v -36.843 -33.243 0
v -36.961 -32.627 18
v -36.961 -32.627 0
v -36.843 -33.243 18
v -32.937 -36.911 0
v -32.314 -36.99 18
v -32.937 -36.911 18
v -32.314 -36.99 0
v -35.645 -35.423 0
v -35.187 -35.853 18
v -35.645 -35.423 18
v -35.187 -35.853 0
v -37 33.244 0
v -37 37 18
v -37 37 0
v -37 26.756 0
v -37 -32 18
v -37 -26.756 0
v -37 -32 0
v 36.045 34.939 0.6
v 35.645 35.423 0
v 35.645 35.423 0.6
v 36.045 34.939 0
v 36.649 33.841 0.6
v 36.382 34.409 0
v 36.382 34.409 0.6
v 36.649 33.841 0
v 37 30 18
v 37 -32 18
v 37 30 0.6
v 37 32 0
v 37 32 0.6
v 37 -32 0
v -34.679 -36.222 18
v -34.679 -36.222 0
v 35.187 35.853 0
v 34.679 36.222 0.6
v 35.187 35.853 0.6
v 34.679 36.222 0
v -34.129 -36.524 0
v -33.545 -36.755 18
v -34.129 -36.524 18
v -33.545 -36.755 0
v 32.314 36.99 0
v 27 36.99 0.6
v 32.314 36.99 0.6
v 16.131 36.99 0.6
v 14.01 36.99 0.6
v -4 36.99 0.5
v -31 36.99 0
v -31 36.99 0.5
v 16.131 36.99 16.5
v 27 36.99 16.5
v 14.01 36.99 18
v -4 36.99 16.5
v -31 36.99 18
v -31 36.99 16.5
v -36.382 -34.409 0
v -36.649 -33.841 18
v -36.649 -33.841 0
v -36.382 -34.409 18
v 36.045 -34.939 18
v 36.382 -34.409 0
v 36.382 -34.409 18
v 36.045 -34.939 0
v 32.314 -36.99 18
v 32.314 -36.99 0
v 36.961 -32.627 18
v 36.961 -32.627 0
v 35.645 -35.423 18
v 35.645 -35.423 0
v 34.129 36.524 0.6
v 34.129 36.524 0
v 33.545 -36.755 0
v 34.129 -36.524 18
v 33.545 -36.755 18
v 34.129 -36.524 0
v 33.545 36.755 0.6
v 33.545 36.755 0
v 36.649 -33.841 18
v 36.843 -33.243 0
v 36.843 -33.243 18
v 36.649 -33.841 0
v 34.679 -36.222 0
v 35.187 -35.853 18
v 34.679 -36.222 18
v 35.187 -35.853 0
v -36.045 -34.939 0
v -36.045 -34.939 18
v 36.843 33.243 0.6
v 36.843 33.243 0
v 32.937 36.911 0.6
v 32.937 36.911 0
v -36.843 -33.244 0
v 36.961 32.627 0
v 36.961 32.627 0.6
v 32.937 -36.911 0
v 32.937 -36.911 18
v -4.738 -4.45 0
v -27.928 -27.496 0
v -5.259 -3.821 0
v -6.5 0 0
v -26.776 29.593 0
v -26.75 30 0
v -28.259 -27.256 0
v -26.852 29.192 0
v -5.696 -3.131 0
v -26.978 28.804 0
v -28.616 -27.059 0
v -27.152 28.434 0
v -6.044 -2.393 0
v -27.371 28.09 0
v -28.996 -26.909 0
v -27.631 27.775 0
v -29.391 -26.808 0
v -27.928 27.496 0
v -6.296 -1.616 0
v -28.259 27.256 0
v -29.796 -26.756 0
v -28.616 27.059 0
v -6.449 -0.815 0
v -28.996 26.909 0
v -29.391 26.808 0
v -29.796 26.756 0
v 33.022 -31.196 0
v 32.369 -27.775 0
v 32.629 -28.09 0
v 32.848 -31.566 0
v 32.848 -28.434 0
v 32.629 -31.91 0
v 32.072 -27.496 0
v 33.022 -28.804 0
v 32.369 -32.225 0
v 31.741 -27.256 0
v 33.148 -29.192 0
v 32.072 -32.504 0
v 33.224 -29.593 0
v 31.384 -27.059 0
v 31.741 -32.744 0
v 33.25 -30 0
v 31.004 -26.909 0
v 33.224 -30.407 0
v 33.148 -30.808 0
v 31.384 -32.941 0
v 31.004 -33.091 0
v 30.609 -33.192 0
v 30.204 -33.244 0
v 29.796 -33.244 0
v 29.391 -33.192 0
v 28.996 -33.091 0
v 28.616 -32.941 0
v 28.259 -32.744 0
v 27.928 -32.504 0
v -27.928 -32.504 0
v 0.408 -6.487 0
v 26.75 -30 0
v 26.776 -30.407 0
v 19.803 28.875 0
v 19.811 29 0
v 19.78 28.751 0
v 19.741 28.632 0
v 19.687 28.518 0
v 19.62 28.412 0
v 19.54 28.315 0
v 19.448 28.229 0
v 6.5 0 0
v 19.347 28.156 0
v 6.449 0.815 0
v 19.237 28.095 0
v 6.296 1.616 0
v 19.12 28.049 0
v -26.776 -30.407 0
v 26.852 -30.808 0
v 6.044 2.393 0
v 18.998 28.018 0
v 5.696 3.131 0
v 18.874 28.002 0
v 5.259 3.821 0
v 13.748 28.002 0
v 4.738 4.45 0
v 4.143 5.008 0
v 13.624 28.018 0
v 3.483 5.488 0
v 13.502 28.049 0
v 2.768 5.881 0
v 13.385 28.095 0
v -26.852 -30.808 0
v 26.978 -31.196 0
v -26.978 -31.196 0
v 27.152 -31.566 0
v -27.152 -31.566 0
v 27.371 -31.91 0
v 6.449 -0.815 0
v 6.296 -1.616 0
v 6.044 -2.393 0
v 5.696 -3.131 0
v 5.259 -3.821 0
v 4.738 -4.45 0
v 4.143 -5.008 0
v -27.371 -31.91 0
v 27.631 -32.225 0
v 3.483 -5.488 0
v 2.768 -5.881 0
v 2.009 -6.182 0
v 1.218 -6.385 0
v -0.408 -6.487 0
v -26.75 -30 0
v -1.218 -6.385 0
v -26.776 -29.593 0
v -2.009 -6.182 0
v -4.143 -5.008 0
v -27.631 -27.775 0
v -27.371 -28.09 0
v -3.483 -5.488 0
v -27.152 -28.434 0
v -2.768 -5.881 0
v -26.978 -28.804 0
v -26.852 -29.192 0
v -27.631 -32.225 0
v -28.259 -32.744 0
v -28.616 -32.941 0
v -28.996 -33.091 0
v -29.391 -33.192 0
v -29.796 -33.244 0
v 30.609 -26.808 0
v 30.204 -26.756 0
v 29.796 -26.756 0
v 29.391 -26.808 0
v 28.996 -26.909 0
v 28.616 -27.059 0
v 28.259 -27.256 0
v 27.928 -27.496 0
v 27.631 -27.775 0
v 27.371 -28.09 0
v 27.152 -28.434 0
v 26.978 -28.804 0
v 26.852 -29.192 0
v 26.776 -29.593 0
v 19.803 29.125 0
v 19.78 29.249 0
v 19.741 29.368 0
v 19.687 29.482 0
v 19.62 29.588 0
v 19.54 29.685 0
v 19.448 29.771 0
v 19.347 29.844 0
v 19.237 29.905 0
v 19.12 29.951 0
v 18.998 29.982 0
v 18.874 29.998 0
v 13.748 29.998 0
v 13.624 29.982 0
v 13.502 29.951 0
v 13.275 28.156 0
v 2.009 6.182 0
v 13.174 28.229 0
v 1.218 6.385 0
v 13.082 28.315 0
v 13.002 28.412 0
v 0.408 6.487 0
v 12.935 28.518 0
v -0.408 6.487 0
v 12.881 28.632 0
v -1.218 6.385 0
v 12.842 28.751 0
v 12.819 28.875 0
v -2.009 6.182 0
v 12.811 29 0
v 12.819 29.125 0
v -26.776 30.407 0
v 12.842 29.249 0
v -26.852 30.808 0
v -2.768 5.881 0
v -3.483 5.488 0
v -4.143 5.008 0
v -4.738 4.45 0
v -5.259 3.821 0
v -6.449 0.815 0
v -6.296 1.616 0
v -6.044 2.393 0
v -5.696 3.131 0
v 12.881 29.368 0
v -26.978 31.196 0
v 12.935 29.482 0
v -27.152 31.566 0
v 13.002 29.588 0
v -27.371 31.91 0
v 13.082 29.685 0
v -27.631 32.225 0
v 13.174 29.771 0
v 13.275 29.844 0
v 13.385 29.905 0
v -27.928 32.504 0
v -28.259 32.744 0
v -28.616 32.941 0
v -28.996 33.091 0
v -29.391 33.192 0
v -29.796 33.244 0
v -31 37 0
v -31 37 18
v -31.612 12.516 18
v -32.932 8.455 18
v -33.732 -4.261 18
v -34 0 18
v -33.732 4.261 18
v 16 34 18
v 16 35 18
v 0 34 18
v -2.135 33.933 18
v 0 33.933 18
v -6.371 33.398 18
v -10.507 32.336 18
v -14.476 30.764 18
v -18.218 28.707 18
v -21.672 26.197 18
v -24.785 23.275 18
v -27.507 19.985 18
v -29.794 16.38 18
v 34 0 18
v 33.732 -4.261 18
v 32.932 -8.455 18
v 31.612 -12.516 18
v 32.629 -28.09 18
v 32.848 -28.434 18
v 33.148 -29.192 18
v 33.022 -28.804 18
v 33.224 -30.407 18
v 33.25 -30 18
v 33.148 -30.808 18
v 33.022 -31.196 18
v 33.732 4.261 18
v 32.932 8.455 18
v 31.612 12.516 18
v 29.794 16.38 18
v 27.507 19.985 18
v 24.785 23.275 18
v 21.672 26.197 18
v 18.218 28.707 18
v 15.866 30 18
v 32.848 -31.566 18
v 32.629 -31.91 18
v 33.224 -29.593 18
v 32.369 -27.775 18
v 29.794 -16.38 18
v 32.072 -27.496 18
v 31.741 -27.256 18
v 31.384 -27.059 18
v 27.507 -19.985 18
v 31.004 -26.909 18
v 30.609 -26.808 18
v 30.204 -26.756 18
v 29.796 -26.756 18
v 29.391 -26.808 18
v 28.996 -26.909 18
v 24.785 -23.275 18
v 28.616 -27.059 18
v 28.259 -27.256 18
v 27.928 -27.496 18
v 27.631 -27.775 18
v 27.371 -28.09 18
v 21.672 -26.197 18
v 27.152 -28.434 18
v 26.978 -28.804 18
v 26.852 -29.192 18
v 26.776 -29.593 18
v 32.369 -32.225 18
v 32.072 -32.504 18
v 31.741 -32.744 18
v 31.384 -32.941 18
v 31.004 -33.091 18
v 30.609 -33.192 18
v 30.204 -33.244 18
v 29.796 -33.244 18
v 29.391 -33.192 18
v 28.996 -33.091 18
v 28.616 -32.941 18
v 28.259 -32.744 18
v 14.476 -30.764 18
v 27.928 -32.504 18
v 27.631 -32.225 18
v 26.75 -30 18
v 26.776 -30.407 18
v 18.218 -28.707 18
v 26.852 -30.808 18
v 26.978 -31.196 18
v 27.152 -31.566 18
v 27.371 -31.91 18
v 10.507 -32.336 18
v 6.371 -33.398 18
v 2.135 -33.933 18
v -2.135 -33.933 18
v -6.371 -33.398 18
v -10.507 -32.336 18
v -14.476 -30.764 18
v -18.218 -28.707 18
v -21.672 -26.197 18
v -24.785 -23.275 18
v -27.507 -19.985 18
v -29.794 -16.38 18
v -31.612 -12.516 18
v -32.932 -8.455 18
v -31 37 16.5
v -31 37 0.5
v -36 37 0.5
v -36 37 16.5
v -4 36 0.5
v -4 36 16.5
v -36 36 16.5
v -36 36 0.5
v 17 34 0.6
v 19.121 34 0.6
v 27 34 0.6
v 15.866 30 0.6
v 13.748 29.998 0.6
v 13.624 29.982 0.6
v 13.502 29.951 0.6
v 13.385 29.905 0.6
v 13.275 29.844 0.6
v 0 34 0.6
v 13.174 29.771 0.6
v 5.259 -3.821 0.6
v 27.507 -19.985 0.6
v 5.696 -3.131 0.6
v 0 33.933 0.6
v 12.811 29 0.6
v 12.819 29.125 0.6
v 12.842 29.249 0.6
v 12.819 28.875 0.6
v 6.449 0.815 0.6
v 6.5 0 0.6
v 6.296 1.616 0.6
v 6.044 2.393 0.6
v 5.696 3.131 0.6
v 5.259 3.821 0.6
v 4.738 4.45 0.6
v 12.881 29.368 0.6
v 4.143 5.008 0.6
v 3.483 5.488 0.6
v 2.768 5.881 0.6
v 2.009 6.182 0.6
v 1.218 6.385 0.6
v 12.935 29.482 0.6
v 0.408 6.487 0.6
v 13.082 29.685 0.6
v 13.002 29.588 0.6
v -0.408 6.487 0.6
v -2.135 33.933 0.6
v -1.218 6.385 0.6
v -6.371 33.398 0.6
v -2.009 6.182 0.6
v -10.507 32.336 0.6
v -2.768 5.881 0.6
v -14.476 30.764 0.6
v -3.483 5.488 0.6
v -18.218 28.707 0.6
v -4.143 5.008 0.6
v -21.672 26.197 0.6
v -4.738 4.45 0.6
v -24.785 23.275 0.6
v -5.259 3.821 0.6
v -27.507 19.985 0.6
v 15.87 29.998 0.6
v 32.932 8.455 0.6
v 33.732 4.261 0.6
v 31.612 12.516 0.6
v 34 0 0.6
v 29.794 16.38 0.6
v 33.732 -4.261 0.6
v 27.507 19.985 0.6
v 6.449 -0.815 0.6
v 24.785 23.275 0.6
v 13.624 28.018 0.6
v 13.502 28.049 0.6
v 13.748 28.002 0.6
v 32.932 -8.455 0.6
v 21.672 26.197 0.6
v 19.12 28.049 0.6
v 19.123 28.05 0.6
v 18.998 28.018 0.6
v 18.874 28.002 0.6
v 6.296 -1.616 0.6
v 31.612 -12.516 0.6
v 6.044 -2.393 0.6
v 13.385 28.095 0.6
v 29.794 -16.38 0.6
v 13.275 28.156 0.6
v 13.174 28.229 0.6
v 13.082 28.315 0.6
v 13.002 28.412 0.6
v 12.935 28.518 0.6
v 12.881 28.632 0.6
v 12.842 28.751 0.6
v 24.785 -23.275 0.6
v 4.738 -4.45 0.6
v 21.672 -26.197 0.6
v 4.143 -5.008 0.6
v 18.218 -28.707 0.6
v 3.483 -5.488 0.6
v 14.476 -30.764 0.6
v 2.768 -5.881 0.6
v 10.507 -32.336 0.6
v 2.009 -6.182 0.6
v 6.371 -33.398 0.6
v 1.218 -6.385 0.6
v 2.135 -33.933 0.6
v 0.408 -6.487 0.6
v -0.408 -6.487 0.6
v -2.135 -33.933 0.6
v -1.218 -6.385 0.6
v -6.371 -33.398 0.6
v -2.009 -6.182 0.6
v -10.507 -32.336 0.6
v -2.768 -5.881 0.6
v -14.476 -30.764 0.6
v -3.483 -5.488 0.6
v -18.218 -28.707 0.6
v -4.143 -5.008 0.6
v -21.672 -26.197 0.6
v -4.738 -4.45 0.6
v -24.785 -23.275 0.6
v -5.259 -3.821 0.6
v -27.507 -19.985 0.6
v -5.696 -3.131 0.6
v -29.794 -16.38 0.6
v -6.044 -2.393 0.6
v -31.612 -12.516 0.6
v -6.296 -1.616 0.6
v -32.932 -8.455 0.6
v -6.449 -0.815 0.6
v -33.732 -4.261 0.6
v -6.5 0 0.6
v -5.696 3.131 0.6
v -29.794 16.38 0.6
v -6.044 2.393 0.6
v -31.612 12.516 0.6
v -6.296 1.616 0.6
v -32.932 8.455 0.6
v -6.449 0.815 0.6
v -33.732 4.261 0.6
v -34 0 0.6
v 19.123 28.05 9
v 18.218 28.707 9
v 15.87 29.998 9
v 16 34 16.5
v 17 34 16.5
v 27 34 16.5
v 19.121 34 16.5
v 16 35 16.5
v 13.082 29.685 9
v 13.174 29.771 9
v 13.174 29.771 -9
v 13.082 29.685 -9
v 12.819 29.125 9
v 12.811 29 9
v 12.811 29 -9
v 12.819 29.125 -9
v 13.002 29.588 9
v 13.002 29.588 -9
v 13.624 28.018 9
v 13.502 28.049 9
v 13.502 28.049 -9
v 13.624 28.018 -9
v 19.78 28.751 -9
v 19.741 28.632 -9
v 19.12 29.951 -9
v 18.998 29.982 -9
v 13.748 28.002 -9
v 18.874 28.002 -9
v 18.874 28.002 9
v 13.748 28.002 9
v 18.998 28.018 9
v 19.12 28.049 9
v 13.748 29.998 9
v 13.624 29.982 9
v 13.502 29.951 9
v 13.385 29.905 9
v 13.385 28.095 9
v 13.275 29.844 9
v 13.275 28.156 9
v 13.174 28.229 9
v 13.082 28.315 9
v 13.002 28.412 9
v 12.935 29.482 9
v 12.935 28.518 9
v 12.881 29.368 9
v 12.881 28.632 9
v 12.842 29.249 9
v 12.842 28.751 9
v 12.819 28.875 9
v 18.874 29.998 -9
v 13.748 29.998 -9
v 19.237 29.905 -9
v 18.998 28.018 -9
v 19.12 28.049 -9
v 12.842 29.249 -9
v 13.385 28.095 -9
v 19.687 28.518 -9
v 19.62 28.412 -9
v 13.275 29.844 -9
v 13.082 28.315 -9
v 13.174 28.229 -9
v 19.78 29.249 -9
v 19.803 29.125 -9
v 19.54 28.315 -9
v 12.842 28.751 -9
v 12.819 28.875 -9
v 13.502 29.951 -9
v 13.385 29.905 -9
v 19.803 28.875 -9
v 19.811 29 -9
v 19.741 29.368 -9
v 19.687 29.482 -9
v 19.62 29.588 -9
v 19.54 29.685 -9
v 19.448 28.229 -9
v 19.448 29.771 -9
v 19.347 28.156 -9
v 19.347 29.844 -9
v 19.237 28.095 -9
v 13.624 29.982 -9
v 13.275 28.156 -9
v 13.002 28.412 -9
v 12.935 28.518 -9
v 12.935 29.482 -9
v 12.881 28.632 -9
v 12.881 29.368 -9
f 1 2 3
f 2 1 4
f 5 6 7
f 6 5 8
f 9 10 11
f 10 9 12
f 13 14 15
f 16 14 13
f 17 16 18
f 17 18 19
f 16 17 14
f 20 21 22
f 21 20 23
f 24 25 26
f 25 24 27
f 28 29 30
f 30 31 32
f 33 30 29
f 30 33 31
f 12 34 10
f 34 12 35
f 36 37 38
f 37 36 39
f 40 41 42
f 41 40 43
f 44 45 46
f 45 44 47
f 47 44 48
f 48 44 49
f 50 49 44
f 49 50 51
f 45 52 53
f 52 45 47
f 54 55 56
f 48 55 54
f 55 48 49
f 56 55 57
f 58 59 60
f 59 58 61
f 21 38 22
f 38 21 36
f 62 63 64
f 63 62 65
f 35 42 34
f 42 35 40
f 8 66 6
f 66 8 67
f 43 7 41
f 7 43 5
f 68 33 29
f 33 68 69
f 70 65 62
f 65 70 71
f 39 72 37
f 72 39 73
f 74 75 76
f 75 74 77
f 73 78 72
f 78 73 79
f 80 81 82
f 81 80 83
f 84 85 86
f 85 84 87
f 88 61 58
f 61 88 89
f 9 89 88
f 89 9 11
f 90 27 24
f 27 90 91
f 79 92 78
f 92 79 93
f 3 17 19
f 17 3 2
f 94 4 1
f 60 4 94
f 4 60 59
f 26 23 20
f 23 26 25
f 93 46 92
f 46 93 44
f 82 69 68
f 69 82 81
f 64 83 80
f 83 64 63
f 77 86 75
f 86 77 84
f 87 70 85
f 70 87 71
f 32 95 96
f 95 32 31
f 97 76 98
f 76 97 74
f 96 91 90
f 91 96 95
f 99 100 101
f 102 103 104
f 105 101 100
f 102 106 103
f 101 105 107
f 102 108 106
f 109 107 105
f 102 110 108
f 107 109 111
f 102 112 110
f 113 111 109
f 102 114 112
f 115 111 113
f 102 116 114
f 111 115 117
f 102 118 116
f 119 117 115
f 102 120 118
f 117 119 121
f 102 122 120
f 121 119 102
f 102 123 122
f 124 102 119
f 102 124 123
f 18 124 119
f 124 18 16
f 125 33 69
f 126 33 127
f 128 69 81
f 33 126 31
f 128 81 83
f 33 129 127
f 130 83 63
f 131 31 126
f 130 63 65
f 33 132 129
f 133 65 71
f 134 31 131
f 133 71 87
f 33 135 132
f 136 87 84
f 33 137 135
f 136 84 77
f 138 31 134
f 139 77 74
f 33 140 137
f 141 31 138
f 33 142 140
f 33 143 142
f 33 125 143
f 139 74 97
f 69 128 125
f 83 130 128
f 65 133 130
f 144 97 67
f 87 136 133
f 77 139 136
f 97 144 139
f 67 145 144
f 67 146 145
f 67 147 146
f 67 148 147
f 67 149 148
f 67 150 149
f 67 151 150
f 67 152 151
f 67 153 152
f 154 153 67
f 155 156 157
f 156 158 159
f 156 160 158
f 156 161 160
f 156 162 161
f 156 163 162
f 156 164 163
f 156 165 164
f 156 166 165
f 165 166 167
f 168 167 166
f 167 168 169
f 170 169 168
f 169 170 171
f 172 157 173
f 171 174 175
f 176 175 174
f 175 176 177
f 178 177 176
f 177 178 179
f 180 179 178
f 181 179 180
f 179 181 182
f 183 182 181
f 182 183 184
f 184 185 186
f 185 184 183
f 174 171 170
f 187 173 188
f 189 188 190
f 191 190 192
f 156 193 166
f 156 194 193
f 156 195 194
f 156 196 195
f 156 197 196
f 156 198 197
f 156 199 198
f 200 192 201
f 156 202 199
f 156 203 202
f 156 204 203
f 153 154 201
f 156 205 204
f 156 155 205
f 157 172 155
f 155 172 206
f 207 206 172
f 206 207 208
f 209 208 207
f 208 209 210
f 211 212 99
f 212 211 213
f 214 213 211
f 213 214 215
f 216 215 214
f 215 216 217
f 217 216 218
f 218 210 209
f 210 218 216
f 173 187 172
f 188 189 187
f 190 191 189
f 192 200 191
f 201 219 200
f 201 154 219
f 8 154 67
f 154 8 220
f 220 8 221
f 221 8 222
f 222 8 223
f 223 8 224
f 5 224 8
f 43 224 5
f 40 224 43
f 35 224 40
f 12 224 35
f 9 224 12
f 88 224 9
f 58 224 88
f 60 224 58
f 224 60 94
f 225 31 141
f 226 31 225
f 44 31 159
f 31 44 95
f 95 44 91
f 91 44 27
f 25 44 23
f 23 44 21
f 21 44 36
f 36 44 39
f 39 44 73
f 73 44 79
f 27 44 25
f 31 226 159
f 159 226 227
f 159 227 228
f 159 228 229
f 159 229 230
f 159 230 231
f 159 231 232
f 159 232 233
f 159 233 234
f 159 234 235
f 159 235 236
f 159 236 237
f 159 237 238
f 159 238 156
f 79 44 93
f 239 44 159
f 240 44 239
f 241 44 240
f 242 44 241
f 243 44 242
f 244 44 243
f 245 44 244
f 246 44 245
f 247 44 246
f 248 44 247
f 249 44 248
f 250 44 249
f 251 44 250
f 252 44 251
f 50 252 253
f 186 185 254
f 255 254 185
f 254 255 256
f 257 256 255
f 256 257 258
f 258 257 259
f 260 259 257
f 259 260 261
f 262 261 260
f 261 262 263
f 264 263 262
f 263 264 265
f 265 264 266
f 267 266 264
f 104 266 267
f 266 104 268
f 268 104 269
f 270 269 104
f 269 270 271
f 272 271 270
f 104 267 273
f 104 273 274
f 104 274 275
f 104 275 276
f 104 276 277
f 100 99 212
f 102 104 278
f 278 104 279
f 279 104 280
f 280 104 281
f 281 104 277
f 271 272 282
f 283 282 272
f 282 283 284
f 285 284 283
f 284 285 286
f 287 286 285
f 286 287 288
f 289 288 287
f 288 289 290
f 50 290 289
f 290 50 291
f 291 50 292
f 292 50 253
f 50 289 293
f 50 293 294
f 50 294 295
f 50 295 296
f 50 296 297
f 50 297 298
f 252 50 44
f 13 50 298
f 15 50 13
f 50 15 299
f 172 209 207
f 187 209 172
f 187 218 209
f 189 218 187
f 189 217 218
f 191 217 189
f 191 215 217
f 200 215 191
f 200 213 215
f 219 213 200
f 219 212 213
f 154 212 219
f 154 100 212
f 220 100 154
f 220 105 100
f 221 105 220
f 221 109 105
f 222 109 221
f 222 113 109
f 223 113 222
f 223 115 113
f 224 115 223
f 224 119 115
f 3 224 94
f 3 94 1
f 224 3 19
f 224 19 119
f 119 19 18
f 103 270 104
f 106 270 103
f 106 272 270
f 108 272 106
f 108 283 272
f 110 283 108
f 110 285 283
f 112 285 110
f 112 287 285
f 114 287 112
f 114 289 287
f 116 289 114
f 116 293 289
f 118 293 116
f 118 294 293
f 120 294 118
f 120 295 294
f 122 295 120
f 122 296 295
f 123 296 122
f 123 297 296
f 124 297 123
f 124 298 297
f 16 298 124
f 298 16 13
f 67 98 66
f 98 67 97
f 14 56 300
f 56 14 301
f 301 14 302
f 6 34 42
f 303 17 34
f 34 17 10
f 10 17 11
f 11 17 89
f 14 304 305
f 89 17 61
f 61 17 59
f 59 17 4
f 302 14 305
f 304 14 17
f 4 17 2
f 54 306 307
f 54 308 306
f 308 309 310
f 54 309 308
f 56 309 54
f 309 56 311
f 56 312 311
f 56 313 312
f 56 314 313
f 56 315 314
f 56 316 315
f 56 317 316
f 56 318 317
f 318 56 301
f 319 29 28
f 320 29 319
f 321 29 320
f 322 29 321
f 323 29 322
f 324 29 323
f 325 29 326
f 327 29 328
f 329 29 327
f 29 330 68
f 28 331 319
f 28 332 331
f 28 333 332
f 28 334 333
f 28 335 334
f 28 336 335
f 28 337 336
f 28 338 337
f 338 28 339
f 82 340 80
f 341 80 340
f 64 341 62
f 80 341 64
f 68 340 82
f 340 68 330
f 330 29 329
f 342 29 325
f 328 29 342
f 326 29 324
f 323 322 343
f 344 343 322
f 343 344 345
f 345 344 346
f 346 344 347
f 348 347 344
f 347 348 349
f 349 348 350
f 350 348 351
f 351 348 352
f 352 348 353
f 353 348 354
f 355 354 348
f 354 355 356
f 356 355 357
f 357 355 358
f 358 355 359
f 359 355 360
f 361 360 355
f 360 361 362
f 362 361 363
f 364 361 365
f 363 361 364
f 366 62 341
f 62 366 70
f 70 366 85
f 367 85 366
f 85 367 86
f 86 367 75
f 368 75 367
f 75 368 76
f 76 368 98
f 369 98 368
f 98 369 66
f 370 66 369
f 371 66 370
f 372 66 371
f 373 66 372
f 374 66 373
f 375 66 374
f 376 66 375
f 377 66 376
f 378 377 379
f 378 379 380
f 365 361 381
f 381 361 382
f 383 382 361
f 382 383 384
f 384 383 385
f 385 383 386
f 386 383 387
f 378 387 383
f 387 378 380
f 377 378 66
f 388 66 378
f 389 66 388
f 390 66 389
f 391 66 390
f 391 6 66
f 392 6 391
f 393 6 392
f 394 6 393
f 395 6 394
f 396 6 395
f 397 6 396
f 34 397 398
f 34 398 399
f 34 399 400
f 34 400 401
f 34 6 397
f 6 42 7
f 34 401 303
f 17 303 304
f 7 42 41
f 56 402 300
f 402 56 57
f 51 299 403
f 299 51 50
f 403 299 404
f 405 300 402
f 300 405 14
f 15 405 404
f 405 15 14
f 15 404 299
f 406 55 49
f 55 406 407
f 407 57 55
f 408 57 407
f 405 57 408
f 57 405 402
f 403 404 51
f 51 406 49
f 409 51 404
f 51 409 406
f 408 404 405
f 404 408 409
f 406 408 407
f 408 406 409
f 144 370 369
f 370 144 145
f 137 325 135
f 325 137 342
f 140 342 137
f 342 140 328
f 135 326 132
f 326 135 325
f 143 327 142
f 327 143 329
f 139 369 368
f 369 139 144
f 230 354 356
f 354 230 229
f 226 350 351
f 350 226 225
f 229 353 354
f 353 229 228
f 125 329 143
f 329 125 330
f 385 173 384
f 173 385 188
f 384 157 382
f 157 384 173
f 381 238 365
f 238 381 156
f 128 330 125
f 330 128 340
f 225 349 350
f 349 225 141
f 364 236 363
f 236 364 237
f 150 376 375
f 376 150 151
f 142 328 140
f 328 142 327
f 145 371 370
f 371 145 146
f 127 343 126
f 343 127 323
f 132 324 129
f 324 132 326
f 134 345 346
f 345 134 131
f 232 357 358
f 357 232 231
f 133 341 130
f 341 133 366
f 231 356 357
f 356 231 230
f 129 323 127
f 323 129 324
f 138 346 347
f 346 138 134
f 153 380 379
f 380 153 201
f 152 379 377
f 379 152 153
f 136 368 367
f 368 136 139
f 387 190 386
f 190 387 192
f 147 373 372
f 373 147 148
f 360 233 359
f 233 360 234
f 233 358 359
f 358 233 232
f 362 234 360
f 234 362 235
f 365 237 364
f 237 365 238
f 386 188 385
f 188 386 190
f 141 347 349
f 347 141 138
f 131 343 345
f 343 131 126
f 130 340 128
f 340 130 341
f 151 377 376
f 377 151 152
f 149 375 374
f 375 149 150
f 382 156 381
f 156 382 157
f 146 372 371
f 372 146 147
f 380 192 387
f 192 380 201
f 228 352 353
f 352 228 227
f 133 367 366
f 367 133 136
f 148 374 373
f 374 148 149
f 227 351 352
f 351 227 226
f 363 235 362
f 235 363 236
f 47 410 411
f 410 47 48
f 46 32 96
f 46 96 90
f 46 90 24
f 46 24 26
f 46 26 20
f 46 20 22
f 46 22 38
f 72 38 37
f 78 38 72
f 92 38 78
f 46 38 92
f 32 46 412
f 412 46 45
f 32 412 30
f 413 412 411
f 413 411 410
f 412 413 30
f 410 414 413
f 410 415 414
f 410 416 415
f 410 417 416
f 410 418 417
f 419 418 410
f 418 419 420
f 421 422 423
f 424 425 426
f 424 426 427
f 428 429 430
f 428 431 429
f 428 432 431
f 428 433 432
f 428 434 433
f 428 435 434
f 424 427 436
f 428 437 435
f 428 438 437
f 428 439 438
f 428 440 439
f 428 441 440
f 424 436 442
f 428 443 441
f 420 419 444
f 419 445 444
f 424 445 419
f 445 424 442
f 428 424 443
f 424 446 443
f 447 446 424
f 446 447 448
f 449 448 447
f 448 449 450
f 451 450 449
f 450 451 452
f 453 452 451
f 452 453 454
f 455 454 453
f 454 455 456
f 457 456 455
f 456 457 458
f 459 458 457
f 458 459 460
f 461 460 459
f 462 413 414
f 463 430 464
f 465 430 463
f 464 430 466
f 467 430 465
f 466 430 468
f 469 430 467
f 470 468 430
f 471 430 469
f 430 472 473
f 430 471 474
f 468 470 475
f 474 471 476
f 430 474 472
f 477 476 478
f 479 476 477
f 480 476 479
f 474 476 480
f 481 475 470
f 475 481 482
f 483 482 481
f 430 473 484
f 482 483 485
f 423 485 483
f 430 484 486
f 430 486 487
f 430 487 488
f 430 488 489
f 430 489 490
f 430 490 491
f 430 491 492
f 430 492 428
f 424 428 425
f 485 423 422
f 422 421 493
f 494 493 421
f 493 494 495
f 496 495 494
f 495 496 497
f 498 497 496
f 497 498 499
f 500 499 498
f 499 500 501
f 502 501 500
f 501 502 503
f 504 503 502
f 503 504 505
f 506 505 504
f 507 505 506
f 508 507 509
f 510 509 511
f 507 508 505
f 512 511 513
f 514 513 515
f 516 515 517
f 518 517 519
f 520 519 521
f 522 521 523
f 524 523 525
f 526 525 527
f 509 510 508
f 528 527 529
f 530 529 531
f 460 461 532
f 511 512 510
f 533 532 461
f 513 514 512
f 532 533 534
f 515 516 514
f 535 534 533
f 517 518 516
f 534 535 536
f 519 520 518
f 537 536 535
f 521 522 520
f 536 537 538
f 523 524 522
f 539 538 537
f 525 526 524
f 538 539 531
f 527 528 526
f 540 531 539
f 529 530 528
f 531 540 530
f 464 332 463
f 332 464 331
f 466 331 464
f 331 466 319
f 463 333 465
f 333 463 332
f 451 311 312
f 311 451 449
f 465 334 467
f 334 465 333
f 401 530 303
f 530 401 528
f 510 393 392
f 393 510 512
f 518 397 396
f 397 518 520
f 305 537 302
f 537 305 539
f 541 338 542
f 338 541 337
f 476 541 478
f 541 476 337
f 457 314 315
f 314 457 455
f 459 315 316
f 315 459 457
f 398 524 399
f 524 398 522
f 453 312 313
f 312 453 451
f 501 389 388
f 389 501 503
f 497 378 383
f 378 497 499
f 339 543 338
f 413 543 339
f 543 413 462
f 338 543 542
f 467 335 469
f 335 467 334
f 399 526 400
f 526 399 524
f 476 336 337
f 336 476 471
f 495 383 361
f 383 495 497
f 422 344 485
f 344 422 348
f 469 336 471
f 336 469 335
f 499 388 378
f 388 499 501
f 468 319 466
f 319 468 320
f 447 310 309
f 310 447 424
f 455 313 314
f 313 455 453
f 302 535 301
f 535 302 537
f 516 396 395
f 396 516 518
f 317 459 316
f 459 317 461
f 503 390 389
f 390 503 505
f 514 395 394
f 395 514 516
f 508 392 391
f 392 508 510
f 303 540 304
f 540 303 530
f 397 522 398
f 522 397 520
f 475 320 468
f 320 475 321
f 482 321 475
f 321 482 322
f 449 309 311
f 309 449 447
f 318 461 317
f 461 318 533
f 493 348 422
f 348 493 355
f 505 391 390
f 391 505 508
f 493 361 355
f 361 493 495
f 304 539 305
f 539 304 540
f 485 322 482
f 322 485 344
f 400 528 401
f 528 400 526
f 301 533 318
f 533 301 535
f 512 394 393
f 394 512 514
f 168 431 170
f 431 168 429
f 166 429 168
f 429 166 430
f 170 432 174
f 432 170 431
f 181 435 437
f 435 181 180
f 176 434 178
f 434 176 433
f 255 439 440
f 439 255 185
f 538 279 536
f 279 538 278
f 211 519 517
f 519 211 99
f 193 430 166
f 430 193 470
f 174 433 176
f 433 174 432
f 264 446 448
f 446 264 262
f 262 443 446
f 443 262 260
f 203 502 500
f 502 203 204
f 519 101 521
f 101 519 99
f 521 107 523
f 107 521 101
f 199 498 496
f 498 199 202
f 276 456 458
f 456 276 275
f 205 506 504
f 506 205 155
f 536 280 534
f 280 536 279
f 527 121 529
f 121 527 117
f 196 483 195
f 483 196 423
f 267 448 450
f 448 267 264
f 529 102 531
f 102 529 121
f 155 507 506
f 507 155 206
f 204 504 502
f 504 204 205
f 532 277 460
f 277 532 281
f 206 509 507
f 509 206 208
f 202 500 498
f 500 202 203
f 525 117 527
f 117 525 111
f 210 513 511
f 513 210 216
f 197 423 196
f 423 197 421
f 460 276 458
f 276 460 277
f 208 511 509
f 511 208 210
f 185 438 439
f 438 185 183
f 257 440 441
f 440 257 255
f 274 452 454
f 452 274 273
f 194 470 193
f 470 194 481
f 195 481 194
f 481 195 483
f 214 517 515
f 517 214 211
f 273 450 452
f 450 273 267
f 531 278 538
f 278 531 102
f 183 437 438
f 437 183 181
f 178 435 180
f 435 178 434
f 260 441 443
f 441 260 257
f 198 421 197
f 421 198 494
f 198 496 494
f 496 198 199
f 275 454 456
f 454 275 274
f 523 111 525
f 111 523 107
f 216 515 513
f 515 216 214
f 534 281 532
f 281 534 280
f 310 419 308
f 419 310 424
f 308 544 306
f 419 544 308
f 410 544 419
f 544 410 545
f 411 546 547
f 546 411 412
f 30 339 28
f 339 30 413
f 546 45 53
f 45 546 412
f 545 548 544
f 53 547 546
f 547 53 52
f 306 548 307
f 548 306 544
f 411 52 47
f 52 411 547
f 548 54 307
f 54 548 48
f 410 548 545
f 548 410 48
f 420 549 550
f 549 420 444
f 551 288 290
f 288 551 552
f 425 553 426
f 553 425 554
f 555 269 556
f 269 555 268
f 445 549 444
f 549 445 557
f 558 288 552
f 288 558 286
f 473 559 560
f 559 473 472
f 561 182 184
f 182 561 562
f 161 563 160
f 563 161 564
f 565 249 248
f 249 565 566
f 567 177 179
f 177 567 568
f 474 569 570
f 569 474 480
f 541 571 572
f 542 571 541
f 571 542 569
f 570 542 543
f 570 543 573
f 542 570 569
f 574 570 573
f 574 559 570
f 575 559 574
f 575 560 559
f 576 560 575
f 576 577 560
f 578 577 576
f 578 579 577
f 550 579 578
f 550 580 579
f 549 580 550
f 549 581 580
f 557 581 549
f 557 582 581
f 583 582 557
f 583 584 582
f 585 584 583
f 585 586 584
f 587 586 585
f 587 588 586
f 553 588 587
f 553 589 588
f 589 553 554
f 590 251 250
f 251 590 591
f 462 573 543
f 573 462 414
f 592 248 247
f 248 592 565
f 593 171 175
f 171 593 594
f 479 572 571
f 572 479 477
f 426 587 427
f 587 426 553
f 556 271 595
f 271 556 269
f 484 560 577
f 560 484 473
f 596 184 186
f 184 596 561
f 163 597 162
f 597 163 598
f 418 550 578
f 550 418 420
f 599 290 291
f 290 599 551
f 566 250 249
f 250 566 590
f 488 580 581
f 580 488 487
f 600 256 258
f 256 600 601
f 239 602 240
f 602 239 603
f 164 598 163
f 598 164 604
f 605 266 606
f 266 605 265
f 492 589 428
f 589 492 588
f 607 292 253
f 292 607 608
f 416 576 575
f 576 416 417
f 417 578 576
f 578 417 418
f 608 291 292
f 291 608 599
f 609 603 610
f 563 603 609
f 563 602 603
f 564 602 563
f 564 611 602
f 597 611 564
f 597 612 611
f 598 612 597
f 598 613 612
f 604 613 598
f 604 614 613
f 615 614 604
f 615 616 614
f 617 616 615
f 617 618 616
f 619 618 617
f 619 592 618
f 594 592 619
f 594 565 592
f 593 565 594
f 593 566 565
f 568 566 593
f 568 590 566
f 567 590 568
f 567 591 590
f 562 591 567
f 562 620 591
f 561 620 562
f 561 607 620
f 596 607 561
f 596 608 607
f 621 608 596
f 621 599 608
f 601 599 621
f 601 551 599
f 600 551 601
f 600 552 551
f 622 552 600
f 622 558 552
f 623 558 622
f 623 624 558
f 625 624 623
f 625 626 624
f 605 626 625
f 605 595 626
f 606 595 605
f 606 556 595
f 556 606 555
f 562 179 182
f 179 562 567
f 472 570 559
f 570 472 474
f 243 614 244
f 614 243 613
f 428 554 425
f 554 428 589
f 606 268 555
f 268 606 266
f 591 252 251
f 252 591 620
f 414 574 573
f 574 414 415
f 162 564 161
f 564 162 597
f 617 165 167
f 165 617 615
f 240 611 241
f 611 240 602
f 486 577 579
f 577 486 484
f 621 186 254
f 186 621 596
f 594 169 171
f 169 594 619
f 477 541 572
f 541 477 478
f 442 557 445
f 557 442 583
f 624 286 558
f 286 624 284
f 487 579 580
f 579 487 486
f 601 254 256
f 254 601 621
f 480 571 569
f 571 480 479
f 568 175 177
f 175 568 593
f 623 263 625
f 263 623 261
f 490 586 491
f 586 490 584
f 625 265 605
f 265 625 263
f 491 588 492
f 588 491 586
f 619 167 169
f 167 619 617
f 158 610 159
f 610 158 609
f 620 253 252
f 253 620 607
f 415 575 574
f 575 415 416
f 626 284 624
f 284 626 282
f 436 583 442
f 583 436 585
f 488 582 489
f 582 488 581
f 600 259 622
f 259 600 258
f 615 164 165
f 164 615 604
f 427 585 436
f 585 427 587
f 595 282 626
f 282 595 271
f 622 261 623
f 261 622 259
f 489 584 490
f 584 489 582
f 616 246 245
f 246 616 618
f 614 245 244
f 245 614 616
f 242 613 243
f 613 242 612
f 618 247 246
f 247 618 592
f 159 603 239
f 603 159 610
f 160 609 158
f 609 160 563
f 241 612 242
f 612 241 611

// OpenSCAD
$fn = 50;


union() {
	difference() {
		union() {
			hull() {
				translate(v = [-32.0000000000, 32.0000000000, 0]) {
					cylinder(h = 18, r = 5);
				}
				translate(v = [32.0000000000, 32.0000000000, 0]) {
					cylinder(h = 18, r = 5);
				}
				translate(v = [-32.0000000000, -32.0000000000, 0]) {
					cylinder(h = 18, r = 5);
				}
				translate(v = [32.0000000000, -32.0000000000, 0]) {
					cylinder(h = 18, r = 5);
				}
			}
			translate(v = [-37.0000000000, 31.0000000000, 0]) {
				cube(size = [6, 6, 18]);
			}
		}
		union() {
			translate(v = [-37.5000000000, -30.0000000000, -250.0000000000]) {
				rotate(a = [0, 0, 0]) {
					difference() {
						union() {
							hull() {
								translate(v = [7.5000000000, 0, 0]) {
									cylinder(h = 250, r = 3.2500000000, r1 = 3.2500000000, r2 = 3.2500000000);
								}
								translate(v = [-7.5000000000, 0, 0]) {
									cylinder(h = 250, r = 3.2500000000, r1 = 3.2500000000, r2 = 3.2500000000);
								}
							}
						}
						union();
					}
				}
			}
			translate(v = [-37.5000000000, 30.0000000000, -250.0000000000]) {
				rotate(a = [0, 0, 0]) {
					difference() {
						union() {
							hull() {
								translate(v = [7.5000000000, 0, 0]) {
									cylinder(h = 250, r = 3.2500000000, r1 = 3.2500000000, r2 = 3.2500000000);
								}
								translate(v = [-7.5000000000, 0, 0]) {
									cylinder(h = 250, r = 3.2500000000, r1 = 3.2500000000, r2 = 3.2500000000);
								}
							}
						}
						union();
					}
				}
			}
			translate(v = [-36.0000000000, 36.0000000000, 0.5000000000]) {
				cube(size = [32, 1, 16]);
			}
			translate(v = [30.0000000000, -30.0000000000, 0]) {
				cylinder(h = 100, r = 3.2500000000);
			}
			translate(v = [0, 0, 0.6000000000]) {
				cylinder(h = 20.4000000000, r = 34.0000000000);
			}
			translate(v = [0, 0, -9.0000000000]) {
				cylinder(h = 18, r = 6.5000000000);
			}
			translate(v = [0.0000000000, 30.0000000000, 0.6000000000]) {
				cube(size = [37.0000000000, 4, 20.4000000000]);
			}
			translate(v = [27.0000000000, 30.0000000000, 0.6000000000]) {
				cube(size = [10, 7, 20.4000000000]);
			}
			translate(v = [16.0000000000, 30.0000000000, 16.5000000000]) {
				cube(size = [21, 7, 1.5000000000]);
			}
			translate(v = [13.2500000000, 37.7500000000, 0.6000000000]) {
				rotate(a = [0, 0, -45]) {
					cube(size = [7.5000000000, 1.5000000000, 20.4000000000]);
				}
			}
			translate(v = [7.0610000000, 28.0000000000, 0.6000000000]) {
				cube(size = [7.5000000000, 2, 17.4000000000]);
			}
		}
	}
	union() {
		translate(v = [16.3110000000, 29.0000000000, -9.0000000000]) {
			rotate(a = [0, 0, 0]) {
				difference() {
					union() {
						#hull() {
							#translate(v = [2.5000000000, 0, 0]) {
								cylinder(h = 18, r = 1.0000000000, r1 = 1.0000000000, r2 = 1.0000000000);
							}
							#translate(v = [-2.5000000000, 0, 0]) {
								cylinder(h = 18, r = 1.0000000000, r1 = 1.0000000000, r2 = 1.0000000000);
							}
						}
					}
					union();
				}
			}
		}
	}
}
